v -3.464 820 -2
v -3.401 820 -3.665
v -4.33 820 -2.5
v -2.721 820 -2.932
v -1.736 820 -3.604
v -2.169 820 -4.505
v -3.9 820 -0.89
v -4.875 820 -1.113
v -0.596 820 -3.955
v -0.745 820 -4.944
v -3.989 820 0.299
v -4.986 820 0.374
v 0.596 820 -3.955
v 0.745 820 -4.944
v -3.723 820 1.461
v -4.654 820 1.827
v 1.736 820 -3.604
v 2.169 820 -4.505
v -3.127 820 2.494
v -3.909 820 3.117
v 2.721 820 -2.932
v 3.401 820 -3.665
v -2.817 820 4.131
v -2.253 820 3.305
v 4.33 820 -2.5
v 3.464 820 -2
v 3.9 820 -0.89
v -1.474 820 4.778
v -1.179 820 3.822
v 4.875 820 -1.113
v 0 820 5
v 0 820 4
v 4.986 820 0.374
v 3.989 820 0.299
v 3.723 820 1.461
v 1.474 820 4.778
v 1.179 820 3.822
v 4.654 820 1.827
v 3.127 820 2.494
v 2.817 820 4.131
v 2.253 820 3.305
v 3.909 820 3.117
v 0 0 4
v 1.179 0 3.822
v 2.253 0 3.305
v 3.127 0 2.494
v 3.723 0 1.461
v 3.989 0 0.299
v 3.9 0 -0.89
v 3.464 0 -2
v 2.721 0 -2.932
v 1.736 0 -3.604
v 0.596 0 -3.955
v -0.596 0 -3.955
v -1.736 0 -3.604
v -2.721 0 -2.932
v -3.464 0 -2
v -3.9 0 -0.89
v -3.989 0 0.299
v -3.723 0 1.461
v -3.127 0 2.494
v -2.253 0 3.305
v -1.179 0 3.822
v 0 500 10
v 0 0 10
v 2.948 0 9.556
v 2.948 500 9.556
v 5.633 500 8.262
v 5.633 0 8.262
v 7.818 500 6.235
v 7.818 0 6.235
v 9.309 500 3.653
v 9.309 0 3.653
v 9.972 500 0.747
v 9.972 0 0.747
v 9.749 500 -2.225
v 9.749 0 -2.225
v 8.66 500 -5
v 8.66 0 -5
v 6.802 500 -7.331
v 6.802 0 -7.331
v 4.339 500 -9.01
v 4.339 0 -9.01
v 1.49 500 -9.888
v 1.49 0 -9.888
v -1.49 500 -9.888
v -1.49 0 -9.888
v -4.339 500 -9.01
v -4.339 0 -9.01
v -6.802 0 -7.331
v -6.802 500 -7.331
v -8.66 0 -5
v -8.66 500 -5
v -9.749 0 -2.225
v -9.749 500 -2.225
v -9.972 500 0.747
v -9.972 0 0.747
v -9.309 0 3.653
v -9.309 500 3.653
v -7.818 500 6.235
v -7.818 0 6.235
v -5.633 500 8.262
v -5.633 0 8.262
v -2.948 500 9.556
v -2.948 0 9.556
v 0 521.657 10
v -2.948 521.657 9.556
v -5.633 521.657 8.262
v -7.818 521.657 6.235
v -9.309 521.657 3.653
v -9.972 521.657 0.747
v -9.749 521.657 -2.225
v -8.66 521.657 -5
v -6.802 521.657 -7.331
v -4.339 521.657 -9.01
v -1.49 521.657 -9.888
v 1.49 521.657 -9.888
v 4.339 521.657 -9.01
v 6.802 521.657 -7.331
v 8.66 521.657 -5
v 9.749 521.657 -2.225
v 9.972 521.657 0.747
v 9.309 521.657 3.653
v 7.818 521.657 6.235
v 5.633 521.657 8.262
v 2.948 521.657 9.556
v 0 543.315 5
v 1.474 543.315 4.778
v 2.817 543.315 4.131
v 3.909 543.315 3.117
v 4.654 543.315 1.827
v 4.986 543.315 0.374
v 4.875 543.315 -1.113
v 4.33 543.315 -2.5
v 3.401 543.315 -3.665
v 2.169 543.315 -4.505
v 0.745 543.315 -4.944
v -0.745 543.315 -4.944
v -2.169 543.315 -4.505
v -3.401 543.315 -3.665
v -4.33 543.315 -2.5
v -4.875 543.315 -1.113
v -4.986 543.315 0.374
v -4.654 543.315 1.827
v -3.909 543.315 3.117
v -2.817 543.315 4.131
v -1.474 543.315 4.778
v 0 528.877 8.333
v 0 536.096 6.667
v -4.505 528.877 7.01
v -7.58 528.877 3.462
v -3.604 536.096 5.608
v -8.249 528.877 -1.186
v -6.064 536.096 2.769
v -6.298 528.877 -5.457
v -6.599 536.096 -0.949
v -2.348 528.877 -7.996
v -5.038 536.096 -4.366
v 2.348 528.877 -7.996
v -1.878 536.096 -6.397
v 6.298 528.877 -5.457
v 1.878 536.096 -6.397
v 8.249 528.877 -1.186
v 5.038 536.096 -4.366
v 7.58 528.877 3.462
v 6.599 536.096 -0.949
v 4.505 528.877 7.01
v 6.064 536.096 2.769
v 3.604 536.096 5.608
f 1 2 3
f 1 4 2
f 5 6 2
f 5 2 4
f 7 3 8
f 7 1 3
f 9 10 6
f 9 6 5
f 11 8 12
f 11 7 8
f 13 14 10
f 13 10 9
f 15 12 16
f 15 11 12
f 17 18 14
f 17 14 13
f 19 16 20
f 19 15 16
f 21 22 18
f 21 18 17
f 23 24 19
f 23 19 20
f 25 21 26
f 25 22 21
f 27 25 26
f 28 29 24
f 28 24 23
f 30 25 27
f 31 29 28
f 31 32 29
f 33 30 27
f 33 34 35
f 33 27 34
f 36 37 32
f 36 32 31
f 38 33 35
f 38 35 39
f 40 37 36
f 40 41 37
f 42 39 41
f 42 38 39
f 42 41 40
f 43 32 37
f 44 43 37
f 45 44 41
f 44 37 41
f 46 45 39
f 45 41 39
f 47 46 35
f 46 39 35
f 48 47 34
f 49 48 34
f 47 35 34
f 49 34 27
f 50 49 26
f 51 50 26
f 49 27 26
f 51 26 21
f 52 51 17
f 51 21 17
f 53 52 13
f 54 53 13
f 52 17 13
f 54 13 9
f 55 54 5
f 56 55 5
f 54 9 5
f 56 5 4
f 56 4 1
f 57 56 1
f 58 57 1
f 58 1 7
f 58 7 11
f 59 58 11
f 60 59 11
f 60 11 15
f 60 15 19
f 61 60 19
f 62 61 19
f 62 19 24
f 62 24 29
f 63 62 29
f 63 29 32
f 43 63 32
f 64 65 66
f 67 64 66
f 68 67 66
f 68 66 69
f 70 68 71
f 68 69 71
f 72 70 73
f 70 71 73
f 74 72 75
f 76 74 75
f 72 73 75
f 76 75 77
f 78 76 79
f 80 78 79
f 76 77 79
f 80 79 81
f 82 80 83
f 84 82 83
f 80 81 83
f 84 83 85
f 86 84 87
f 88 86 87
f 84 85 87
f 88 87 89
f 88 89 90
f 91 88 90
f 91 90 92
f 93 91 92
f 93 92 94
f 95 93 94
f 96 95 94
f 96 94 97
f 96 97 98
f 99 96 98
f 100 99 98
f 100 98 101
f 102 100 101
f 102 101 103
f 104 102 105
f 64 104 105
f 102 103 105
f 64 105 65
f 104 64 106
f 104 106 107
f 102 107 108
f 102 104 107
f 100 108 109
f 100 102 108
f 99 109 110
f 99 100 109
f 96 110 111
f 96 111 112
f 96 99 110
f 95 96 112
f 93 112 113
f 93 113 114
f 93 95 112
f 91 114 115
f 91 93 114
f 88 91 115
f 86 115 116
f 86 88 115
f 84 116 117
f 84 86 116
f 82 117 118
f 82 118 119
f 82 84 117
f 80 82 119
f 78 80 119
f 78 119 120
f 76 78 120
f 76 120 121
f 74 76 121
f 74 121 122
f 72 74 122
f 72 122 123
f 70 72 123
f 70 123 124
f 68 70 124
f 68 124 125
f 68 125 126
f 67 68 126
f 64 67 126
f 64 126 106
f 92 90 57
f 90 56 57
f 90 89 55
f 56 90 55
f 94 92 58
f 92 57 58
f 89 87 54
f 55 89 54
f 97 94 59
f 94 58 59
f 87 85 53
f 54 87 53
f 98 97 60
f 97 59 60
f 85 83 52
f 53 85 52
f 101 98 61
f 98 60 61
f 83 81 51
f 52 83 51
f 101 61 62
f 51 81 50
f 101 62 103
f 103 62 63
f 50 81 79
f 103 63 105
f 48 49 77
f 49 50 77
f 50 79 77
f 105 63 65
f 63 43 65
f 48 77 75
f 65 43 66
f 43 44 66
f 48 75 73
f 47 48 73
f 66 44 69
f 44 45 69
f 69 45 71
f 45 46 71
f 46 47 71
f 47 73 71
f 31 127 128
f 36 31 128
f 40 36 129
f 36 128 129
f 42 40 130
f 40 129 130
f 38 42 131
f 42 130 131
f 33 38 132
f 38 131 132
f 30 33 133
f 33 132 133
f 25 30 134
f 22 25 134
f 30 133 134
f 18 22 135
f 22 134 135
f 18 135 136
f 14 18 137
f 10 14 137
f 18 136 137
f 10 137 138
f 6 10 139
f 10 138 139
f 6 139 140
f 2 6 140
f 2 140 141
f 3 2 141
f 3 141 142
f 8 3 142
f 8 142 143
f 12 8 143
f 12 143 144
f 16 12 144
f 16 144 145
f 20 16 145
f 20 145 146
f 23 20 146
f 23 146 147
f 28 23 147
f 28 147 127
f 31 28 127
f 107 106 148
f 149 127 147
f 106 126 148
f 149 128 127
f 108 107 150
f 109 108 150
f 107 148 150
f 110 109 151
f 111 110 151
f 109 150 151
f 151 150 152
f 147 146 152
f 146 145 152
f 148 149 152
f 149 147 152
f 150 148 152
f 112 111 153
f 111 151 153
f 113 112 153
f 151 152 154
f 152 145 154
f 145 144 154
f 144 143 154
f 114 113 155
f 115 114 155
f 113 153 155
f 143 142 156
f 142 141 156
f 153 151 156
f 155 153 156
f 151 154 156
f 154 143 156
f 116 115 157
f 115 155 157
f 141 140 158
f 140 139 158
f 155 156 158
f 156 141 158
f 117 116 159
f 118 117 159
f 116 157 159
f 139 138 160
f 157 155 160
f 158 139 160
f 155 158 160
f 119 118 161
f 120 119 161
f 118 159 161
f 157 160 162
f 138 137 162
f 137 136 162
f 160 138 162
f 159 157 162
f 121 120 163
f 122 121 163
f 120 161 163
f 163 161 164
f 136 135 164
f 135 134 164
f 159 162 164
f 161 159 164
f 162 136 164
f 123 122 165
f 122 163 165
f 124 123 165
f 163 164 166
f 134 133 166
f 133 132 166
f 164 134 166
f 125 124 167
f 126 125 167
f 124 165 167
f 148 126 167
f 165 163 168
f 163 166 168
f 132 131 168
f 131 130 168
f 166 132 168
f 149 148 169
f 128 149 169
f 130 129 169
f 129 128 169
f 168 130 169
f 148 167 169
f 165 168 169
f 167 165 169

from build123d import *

# Parameters (mm, degrees)
ESQUISSE1_R             = 5
BOSS_EXTRU_1_DEPTH      = 820
ESQUISSE2_R             = 10
BOSS_EXTRU_2_DEPTH      = 500
CHANFREIN1_SIZE         = 10
CHANFREIN1_SIZE_2       = 43.314758743
ESQUISSE3_R             = 4
ENL_V_MAT_EXTRU_1_DEPTH = 821.121942153


with BuildPart() as part:
    # Esquisse1 → Boss.-Extru.1 (new body)
    with BuildSketch(Plane(origin=(0, 0, 0), x_dir=(1, 0, 0), z_dir=(0, 1, 0))):
        with Locations(Location((0, 0, 0), (0, 0, 270))):
            Circle(ESQUISSE1_R)
    extrude(amount=BOSS_EXTRU_1_DEPTH)

    # Esquisse2 → Boss.-Extru.2 (add)
    with BuildSketch(Plane(origin=(0, 0, 0), x_dir=(1, 0, 0), z_dir=(0, 1, 0))):
        with Locations(Location((0, 0, 0), (0, 0, 270))):
            Circle(ESQUISSE2_R)
    extrude(amount=BOSS_EXTRU_2_DEPTH)

    # Chanfrein1
    # the kernel refuses this chamfer: 43.314758743, 10 mm, written as the material it adds along each edge
    with BuildSketch(Plane(origin=(0, 500, 0), x_dir=(0, 0, 1), z_dir=(1, 0, 0))) as chanfrein1_piece_1_section:
        Polygon((5 + CHANFREIN1_SIZE, 0), (5, -CHANFREIN1_SIZE_2), (5, 0), align=None)
    chanfrein1_piece_1 = revolve(axis=Axis((0, 500, 0), (0, -1, 0)), mode=Mode.PRIVATE)
    chanfrein1_piece_1 = chanfrein1_piece_1 & Plane(origin=(0, 533.283833366, 0), x_dir=(0, 0, 1), z_dir=(0, -1, 0)) * Cylinder(10, 174, mode=Mode.PRIVATE)
    add(chanfrein1_piece_1)

    # Esquisse3 → Enlèv. mat.-Extru.1 (cut, through all)
    with BuildSketch(Plane(origin=(0, 820, 0), x_dir=(1, 0, 0), z_dir=(0, 1, 0))):
        with Locations(Location((0, 0, 0), (0, 0, 270))):
            Circle(ESQUISSE3_R)
    extrude(amount=-ENL_V_MAT_EXTRU_1_DEPTH, mode=Mode.SUBTRACT)


solid = part.part
